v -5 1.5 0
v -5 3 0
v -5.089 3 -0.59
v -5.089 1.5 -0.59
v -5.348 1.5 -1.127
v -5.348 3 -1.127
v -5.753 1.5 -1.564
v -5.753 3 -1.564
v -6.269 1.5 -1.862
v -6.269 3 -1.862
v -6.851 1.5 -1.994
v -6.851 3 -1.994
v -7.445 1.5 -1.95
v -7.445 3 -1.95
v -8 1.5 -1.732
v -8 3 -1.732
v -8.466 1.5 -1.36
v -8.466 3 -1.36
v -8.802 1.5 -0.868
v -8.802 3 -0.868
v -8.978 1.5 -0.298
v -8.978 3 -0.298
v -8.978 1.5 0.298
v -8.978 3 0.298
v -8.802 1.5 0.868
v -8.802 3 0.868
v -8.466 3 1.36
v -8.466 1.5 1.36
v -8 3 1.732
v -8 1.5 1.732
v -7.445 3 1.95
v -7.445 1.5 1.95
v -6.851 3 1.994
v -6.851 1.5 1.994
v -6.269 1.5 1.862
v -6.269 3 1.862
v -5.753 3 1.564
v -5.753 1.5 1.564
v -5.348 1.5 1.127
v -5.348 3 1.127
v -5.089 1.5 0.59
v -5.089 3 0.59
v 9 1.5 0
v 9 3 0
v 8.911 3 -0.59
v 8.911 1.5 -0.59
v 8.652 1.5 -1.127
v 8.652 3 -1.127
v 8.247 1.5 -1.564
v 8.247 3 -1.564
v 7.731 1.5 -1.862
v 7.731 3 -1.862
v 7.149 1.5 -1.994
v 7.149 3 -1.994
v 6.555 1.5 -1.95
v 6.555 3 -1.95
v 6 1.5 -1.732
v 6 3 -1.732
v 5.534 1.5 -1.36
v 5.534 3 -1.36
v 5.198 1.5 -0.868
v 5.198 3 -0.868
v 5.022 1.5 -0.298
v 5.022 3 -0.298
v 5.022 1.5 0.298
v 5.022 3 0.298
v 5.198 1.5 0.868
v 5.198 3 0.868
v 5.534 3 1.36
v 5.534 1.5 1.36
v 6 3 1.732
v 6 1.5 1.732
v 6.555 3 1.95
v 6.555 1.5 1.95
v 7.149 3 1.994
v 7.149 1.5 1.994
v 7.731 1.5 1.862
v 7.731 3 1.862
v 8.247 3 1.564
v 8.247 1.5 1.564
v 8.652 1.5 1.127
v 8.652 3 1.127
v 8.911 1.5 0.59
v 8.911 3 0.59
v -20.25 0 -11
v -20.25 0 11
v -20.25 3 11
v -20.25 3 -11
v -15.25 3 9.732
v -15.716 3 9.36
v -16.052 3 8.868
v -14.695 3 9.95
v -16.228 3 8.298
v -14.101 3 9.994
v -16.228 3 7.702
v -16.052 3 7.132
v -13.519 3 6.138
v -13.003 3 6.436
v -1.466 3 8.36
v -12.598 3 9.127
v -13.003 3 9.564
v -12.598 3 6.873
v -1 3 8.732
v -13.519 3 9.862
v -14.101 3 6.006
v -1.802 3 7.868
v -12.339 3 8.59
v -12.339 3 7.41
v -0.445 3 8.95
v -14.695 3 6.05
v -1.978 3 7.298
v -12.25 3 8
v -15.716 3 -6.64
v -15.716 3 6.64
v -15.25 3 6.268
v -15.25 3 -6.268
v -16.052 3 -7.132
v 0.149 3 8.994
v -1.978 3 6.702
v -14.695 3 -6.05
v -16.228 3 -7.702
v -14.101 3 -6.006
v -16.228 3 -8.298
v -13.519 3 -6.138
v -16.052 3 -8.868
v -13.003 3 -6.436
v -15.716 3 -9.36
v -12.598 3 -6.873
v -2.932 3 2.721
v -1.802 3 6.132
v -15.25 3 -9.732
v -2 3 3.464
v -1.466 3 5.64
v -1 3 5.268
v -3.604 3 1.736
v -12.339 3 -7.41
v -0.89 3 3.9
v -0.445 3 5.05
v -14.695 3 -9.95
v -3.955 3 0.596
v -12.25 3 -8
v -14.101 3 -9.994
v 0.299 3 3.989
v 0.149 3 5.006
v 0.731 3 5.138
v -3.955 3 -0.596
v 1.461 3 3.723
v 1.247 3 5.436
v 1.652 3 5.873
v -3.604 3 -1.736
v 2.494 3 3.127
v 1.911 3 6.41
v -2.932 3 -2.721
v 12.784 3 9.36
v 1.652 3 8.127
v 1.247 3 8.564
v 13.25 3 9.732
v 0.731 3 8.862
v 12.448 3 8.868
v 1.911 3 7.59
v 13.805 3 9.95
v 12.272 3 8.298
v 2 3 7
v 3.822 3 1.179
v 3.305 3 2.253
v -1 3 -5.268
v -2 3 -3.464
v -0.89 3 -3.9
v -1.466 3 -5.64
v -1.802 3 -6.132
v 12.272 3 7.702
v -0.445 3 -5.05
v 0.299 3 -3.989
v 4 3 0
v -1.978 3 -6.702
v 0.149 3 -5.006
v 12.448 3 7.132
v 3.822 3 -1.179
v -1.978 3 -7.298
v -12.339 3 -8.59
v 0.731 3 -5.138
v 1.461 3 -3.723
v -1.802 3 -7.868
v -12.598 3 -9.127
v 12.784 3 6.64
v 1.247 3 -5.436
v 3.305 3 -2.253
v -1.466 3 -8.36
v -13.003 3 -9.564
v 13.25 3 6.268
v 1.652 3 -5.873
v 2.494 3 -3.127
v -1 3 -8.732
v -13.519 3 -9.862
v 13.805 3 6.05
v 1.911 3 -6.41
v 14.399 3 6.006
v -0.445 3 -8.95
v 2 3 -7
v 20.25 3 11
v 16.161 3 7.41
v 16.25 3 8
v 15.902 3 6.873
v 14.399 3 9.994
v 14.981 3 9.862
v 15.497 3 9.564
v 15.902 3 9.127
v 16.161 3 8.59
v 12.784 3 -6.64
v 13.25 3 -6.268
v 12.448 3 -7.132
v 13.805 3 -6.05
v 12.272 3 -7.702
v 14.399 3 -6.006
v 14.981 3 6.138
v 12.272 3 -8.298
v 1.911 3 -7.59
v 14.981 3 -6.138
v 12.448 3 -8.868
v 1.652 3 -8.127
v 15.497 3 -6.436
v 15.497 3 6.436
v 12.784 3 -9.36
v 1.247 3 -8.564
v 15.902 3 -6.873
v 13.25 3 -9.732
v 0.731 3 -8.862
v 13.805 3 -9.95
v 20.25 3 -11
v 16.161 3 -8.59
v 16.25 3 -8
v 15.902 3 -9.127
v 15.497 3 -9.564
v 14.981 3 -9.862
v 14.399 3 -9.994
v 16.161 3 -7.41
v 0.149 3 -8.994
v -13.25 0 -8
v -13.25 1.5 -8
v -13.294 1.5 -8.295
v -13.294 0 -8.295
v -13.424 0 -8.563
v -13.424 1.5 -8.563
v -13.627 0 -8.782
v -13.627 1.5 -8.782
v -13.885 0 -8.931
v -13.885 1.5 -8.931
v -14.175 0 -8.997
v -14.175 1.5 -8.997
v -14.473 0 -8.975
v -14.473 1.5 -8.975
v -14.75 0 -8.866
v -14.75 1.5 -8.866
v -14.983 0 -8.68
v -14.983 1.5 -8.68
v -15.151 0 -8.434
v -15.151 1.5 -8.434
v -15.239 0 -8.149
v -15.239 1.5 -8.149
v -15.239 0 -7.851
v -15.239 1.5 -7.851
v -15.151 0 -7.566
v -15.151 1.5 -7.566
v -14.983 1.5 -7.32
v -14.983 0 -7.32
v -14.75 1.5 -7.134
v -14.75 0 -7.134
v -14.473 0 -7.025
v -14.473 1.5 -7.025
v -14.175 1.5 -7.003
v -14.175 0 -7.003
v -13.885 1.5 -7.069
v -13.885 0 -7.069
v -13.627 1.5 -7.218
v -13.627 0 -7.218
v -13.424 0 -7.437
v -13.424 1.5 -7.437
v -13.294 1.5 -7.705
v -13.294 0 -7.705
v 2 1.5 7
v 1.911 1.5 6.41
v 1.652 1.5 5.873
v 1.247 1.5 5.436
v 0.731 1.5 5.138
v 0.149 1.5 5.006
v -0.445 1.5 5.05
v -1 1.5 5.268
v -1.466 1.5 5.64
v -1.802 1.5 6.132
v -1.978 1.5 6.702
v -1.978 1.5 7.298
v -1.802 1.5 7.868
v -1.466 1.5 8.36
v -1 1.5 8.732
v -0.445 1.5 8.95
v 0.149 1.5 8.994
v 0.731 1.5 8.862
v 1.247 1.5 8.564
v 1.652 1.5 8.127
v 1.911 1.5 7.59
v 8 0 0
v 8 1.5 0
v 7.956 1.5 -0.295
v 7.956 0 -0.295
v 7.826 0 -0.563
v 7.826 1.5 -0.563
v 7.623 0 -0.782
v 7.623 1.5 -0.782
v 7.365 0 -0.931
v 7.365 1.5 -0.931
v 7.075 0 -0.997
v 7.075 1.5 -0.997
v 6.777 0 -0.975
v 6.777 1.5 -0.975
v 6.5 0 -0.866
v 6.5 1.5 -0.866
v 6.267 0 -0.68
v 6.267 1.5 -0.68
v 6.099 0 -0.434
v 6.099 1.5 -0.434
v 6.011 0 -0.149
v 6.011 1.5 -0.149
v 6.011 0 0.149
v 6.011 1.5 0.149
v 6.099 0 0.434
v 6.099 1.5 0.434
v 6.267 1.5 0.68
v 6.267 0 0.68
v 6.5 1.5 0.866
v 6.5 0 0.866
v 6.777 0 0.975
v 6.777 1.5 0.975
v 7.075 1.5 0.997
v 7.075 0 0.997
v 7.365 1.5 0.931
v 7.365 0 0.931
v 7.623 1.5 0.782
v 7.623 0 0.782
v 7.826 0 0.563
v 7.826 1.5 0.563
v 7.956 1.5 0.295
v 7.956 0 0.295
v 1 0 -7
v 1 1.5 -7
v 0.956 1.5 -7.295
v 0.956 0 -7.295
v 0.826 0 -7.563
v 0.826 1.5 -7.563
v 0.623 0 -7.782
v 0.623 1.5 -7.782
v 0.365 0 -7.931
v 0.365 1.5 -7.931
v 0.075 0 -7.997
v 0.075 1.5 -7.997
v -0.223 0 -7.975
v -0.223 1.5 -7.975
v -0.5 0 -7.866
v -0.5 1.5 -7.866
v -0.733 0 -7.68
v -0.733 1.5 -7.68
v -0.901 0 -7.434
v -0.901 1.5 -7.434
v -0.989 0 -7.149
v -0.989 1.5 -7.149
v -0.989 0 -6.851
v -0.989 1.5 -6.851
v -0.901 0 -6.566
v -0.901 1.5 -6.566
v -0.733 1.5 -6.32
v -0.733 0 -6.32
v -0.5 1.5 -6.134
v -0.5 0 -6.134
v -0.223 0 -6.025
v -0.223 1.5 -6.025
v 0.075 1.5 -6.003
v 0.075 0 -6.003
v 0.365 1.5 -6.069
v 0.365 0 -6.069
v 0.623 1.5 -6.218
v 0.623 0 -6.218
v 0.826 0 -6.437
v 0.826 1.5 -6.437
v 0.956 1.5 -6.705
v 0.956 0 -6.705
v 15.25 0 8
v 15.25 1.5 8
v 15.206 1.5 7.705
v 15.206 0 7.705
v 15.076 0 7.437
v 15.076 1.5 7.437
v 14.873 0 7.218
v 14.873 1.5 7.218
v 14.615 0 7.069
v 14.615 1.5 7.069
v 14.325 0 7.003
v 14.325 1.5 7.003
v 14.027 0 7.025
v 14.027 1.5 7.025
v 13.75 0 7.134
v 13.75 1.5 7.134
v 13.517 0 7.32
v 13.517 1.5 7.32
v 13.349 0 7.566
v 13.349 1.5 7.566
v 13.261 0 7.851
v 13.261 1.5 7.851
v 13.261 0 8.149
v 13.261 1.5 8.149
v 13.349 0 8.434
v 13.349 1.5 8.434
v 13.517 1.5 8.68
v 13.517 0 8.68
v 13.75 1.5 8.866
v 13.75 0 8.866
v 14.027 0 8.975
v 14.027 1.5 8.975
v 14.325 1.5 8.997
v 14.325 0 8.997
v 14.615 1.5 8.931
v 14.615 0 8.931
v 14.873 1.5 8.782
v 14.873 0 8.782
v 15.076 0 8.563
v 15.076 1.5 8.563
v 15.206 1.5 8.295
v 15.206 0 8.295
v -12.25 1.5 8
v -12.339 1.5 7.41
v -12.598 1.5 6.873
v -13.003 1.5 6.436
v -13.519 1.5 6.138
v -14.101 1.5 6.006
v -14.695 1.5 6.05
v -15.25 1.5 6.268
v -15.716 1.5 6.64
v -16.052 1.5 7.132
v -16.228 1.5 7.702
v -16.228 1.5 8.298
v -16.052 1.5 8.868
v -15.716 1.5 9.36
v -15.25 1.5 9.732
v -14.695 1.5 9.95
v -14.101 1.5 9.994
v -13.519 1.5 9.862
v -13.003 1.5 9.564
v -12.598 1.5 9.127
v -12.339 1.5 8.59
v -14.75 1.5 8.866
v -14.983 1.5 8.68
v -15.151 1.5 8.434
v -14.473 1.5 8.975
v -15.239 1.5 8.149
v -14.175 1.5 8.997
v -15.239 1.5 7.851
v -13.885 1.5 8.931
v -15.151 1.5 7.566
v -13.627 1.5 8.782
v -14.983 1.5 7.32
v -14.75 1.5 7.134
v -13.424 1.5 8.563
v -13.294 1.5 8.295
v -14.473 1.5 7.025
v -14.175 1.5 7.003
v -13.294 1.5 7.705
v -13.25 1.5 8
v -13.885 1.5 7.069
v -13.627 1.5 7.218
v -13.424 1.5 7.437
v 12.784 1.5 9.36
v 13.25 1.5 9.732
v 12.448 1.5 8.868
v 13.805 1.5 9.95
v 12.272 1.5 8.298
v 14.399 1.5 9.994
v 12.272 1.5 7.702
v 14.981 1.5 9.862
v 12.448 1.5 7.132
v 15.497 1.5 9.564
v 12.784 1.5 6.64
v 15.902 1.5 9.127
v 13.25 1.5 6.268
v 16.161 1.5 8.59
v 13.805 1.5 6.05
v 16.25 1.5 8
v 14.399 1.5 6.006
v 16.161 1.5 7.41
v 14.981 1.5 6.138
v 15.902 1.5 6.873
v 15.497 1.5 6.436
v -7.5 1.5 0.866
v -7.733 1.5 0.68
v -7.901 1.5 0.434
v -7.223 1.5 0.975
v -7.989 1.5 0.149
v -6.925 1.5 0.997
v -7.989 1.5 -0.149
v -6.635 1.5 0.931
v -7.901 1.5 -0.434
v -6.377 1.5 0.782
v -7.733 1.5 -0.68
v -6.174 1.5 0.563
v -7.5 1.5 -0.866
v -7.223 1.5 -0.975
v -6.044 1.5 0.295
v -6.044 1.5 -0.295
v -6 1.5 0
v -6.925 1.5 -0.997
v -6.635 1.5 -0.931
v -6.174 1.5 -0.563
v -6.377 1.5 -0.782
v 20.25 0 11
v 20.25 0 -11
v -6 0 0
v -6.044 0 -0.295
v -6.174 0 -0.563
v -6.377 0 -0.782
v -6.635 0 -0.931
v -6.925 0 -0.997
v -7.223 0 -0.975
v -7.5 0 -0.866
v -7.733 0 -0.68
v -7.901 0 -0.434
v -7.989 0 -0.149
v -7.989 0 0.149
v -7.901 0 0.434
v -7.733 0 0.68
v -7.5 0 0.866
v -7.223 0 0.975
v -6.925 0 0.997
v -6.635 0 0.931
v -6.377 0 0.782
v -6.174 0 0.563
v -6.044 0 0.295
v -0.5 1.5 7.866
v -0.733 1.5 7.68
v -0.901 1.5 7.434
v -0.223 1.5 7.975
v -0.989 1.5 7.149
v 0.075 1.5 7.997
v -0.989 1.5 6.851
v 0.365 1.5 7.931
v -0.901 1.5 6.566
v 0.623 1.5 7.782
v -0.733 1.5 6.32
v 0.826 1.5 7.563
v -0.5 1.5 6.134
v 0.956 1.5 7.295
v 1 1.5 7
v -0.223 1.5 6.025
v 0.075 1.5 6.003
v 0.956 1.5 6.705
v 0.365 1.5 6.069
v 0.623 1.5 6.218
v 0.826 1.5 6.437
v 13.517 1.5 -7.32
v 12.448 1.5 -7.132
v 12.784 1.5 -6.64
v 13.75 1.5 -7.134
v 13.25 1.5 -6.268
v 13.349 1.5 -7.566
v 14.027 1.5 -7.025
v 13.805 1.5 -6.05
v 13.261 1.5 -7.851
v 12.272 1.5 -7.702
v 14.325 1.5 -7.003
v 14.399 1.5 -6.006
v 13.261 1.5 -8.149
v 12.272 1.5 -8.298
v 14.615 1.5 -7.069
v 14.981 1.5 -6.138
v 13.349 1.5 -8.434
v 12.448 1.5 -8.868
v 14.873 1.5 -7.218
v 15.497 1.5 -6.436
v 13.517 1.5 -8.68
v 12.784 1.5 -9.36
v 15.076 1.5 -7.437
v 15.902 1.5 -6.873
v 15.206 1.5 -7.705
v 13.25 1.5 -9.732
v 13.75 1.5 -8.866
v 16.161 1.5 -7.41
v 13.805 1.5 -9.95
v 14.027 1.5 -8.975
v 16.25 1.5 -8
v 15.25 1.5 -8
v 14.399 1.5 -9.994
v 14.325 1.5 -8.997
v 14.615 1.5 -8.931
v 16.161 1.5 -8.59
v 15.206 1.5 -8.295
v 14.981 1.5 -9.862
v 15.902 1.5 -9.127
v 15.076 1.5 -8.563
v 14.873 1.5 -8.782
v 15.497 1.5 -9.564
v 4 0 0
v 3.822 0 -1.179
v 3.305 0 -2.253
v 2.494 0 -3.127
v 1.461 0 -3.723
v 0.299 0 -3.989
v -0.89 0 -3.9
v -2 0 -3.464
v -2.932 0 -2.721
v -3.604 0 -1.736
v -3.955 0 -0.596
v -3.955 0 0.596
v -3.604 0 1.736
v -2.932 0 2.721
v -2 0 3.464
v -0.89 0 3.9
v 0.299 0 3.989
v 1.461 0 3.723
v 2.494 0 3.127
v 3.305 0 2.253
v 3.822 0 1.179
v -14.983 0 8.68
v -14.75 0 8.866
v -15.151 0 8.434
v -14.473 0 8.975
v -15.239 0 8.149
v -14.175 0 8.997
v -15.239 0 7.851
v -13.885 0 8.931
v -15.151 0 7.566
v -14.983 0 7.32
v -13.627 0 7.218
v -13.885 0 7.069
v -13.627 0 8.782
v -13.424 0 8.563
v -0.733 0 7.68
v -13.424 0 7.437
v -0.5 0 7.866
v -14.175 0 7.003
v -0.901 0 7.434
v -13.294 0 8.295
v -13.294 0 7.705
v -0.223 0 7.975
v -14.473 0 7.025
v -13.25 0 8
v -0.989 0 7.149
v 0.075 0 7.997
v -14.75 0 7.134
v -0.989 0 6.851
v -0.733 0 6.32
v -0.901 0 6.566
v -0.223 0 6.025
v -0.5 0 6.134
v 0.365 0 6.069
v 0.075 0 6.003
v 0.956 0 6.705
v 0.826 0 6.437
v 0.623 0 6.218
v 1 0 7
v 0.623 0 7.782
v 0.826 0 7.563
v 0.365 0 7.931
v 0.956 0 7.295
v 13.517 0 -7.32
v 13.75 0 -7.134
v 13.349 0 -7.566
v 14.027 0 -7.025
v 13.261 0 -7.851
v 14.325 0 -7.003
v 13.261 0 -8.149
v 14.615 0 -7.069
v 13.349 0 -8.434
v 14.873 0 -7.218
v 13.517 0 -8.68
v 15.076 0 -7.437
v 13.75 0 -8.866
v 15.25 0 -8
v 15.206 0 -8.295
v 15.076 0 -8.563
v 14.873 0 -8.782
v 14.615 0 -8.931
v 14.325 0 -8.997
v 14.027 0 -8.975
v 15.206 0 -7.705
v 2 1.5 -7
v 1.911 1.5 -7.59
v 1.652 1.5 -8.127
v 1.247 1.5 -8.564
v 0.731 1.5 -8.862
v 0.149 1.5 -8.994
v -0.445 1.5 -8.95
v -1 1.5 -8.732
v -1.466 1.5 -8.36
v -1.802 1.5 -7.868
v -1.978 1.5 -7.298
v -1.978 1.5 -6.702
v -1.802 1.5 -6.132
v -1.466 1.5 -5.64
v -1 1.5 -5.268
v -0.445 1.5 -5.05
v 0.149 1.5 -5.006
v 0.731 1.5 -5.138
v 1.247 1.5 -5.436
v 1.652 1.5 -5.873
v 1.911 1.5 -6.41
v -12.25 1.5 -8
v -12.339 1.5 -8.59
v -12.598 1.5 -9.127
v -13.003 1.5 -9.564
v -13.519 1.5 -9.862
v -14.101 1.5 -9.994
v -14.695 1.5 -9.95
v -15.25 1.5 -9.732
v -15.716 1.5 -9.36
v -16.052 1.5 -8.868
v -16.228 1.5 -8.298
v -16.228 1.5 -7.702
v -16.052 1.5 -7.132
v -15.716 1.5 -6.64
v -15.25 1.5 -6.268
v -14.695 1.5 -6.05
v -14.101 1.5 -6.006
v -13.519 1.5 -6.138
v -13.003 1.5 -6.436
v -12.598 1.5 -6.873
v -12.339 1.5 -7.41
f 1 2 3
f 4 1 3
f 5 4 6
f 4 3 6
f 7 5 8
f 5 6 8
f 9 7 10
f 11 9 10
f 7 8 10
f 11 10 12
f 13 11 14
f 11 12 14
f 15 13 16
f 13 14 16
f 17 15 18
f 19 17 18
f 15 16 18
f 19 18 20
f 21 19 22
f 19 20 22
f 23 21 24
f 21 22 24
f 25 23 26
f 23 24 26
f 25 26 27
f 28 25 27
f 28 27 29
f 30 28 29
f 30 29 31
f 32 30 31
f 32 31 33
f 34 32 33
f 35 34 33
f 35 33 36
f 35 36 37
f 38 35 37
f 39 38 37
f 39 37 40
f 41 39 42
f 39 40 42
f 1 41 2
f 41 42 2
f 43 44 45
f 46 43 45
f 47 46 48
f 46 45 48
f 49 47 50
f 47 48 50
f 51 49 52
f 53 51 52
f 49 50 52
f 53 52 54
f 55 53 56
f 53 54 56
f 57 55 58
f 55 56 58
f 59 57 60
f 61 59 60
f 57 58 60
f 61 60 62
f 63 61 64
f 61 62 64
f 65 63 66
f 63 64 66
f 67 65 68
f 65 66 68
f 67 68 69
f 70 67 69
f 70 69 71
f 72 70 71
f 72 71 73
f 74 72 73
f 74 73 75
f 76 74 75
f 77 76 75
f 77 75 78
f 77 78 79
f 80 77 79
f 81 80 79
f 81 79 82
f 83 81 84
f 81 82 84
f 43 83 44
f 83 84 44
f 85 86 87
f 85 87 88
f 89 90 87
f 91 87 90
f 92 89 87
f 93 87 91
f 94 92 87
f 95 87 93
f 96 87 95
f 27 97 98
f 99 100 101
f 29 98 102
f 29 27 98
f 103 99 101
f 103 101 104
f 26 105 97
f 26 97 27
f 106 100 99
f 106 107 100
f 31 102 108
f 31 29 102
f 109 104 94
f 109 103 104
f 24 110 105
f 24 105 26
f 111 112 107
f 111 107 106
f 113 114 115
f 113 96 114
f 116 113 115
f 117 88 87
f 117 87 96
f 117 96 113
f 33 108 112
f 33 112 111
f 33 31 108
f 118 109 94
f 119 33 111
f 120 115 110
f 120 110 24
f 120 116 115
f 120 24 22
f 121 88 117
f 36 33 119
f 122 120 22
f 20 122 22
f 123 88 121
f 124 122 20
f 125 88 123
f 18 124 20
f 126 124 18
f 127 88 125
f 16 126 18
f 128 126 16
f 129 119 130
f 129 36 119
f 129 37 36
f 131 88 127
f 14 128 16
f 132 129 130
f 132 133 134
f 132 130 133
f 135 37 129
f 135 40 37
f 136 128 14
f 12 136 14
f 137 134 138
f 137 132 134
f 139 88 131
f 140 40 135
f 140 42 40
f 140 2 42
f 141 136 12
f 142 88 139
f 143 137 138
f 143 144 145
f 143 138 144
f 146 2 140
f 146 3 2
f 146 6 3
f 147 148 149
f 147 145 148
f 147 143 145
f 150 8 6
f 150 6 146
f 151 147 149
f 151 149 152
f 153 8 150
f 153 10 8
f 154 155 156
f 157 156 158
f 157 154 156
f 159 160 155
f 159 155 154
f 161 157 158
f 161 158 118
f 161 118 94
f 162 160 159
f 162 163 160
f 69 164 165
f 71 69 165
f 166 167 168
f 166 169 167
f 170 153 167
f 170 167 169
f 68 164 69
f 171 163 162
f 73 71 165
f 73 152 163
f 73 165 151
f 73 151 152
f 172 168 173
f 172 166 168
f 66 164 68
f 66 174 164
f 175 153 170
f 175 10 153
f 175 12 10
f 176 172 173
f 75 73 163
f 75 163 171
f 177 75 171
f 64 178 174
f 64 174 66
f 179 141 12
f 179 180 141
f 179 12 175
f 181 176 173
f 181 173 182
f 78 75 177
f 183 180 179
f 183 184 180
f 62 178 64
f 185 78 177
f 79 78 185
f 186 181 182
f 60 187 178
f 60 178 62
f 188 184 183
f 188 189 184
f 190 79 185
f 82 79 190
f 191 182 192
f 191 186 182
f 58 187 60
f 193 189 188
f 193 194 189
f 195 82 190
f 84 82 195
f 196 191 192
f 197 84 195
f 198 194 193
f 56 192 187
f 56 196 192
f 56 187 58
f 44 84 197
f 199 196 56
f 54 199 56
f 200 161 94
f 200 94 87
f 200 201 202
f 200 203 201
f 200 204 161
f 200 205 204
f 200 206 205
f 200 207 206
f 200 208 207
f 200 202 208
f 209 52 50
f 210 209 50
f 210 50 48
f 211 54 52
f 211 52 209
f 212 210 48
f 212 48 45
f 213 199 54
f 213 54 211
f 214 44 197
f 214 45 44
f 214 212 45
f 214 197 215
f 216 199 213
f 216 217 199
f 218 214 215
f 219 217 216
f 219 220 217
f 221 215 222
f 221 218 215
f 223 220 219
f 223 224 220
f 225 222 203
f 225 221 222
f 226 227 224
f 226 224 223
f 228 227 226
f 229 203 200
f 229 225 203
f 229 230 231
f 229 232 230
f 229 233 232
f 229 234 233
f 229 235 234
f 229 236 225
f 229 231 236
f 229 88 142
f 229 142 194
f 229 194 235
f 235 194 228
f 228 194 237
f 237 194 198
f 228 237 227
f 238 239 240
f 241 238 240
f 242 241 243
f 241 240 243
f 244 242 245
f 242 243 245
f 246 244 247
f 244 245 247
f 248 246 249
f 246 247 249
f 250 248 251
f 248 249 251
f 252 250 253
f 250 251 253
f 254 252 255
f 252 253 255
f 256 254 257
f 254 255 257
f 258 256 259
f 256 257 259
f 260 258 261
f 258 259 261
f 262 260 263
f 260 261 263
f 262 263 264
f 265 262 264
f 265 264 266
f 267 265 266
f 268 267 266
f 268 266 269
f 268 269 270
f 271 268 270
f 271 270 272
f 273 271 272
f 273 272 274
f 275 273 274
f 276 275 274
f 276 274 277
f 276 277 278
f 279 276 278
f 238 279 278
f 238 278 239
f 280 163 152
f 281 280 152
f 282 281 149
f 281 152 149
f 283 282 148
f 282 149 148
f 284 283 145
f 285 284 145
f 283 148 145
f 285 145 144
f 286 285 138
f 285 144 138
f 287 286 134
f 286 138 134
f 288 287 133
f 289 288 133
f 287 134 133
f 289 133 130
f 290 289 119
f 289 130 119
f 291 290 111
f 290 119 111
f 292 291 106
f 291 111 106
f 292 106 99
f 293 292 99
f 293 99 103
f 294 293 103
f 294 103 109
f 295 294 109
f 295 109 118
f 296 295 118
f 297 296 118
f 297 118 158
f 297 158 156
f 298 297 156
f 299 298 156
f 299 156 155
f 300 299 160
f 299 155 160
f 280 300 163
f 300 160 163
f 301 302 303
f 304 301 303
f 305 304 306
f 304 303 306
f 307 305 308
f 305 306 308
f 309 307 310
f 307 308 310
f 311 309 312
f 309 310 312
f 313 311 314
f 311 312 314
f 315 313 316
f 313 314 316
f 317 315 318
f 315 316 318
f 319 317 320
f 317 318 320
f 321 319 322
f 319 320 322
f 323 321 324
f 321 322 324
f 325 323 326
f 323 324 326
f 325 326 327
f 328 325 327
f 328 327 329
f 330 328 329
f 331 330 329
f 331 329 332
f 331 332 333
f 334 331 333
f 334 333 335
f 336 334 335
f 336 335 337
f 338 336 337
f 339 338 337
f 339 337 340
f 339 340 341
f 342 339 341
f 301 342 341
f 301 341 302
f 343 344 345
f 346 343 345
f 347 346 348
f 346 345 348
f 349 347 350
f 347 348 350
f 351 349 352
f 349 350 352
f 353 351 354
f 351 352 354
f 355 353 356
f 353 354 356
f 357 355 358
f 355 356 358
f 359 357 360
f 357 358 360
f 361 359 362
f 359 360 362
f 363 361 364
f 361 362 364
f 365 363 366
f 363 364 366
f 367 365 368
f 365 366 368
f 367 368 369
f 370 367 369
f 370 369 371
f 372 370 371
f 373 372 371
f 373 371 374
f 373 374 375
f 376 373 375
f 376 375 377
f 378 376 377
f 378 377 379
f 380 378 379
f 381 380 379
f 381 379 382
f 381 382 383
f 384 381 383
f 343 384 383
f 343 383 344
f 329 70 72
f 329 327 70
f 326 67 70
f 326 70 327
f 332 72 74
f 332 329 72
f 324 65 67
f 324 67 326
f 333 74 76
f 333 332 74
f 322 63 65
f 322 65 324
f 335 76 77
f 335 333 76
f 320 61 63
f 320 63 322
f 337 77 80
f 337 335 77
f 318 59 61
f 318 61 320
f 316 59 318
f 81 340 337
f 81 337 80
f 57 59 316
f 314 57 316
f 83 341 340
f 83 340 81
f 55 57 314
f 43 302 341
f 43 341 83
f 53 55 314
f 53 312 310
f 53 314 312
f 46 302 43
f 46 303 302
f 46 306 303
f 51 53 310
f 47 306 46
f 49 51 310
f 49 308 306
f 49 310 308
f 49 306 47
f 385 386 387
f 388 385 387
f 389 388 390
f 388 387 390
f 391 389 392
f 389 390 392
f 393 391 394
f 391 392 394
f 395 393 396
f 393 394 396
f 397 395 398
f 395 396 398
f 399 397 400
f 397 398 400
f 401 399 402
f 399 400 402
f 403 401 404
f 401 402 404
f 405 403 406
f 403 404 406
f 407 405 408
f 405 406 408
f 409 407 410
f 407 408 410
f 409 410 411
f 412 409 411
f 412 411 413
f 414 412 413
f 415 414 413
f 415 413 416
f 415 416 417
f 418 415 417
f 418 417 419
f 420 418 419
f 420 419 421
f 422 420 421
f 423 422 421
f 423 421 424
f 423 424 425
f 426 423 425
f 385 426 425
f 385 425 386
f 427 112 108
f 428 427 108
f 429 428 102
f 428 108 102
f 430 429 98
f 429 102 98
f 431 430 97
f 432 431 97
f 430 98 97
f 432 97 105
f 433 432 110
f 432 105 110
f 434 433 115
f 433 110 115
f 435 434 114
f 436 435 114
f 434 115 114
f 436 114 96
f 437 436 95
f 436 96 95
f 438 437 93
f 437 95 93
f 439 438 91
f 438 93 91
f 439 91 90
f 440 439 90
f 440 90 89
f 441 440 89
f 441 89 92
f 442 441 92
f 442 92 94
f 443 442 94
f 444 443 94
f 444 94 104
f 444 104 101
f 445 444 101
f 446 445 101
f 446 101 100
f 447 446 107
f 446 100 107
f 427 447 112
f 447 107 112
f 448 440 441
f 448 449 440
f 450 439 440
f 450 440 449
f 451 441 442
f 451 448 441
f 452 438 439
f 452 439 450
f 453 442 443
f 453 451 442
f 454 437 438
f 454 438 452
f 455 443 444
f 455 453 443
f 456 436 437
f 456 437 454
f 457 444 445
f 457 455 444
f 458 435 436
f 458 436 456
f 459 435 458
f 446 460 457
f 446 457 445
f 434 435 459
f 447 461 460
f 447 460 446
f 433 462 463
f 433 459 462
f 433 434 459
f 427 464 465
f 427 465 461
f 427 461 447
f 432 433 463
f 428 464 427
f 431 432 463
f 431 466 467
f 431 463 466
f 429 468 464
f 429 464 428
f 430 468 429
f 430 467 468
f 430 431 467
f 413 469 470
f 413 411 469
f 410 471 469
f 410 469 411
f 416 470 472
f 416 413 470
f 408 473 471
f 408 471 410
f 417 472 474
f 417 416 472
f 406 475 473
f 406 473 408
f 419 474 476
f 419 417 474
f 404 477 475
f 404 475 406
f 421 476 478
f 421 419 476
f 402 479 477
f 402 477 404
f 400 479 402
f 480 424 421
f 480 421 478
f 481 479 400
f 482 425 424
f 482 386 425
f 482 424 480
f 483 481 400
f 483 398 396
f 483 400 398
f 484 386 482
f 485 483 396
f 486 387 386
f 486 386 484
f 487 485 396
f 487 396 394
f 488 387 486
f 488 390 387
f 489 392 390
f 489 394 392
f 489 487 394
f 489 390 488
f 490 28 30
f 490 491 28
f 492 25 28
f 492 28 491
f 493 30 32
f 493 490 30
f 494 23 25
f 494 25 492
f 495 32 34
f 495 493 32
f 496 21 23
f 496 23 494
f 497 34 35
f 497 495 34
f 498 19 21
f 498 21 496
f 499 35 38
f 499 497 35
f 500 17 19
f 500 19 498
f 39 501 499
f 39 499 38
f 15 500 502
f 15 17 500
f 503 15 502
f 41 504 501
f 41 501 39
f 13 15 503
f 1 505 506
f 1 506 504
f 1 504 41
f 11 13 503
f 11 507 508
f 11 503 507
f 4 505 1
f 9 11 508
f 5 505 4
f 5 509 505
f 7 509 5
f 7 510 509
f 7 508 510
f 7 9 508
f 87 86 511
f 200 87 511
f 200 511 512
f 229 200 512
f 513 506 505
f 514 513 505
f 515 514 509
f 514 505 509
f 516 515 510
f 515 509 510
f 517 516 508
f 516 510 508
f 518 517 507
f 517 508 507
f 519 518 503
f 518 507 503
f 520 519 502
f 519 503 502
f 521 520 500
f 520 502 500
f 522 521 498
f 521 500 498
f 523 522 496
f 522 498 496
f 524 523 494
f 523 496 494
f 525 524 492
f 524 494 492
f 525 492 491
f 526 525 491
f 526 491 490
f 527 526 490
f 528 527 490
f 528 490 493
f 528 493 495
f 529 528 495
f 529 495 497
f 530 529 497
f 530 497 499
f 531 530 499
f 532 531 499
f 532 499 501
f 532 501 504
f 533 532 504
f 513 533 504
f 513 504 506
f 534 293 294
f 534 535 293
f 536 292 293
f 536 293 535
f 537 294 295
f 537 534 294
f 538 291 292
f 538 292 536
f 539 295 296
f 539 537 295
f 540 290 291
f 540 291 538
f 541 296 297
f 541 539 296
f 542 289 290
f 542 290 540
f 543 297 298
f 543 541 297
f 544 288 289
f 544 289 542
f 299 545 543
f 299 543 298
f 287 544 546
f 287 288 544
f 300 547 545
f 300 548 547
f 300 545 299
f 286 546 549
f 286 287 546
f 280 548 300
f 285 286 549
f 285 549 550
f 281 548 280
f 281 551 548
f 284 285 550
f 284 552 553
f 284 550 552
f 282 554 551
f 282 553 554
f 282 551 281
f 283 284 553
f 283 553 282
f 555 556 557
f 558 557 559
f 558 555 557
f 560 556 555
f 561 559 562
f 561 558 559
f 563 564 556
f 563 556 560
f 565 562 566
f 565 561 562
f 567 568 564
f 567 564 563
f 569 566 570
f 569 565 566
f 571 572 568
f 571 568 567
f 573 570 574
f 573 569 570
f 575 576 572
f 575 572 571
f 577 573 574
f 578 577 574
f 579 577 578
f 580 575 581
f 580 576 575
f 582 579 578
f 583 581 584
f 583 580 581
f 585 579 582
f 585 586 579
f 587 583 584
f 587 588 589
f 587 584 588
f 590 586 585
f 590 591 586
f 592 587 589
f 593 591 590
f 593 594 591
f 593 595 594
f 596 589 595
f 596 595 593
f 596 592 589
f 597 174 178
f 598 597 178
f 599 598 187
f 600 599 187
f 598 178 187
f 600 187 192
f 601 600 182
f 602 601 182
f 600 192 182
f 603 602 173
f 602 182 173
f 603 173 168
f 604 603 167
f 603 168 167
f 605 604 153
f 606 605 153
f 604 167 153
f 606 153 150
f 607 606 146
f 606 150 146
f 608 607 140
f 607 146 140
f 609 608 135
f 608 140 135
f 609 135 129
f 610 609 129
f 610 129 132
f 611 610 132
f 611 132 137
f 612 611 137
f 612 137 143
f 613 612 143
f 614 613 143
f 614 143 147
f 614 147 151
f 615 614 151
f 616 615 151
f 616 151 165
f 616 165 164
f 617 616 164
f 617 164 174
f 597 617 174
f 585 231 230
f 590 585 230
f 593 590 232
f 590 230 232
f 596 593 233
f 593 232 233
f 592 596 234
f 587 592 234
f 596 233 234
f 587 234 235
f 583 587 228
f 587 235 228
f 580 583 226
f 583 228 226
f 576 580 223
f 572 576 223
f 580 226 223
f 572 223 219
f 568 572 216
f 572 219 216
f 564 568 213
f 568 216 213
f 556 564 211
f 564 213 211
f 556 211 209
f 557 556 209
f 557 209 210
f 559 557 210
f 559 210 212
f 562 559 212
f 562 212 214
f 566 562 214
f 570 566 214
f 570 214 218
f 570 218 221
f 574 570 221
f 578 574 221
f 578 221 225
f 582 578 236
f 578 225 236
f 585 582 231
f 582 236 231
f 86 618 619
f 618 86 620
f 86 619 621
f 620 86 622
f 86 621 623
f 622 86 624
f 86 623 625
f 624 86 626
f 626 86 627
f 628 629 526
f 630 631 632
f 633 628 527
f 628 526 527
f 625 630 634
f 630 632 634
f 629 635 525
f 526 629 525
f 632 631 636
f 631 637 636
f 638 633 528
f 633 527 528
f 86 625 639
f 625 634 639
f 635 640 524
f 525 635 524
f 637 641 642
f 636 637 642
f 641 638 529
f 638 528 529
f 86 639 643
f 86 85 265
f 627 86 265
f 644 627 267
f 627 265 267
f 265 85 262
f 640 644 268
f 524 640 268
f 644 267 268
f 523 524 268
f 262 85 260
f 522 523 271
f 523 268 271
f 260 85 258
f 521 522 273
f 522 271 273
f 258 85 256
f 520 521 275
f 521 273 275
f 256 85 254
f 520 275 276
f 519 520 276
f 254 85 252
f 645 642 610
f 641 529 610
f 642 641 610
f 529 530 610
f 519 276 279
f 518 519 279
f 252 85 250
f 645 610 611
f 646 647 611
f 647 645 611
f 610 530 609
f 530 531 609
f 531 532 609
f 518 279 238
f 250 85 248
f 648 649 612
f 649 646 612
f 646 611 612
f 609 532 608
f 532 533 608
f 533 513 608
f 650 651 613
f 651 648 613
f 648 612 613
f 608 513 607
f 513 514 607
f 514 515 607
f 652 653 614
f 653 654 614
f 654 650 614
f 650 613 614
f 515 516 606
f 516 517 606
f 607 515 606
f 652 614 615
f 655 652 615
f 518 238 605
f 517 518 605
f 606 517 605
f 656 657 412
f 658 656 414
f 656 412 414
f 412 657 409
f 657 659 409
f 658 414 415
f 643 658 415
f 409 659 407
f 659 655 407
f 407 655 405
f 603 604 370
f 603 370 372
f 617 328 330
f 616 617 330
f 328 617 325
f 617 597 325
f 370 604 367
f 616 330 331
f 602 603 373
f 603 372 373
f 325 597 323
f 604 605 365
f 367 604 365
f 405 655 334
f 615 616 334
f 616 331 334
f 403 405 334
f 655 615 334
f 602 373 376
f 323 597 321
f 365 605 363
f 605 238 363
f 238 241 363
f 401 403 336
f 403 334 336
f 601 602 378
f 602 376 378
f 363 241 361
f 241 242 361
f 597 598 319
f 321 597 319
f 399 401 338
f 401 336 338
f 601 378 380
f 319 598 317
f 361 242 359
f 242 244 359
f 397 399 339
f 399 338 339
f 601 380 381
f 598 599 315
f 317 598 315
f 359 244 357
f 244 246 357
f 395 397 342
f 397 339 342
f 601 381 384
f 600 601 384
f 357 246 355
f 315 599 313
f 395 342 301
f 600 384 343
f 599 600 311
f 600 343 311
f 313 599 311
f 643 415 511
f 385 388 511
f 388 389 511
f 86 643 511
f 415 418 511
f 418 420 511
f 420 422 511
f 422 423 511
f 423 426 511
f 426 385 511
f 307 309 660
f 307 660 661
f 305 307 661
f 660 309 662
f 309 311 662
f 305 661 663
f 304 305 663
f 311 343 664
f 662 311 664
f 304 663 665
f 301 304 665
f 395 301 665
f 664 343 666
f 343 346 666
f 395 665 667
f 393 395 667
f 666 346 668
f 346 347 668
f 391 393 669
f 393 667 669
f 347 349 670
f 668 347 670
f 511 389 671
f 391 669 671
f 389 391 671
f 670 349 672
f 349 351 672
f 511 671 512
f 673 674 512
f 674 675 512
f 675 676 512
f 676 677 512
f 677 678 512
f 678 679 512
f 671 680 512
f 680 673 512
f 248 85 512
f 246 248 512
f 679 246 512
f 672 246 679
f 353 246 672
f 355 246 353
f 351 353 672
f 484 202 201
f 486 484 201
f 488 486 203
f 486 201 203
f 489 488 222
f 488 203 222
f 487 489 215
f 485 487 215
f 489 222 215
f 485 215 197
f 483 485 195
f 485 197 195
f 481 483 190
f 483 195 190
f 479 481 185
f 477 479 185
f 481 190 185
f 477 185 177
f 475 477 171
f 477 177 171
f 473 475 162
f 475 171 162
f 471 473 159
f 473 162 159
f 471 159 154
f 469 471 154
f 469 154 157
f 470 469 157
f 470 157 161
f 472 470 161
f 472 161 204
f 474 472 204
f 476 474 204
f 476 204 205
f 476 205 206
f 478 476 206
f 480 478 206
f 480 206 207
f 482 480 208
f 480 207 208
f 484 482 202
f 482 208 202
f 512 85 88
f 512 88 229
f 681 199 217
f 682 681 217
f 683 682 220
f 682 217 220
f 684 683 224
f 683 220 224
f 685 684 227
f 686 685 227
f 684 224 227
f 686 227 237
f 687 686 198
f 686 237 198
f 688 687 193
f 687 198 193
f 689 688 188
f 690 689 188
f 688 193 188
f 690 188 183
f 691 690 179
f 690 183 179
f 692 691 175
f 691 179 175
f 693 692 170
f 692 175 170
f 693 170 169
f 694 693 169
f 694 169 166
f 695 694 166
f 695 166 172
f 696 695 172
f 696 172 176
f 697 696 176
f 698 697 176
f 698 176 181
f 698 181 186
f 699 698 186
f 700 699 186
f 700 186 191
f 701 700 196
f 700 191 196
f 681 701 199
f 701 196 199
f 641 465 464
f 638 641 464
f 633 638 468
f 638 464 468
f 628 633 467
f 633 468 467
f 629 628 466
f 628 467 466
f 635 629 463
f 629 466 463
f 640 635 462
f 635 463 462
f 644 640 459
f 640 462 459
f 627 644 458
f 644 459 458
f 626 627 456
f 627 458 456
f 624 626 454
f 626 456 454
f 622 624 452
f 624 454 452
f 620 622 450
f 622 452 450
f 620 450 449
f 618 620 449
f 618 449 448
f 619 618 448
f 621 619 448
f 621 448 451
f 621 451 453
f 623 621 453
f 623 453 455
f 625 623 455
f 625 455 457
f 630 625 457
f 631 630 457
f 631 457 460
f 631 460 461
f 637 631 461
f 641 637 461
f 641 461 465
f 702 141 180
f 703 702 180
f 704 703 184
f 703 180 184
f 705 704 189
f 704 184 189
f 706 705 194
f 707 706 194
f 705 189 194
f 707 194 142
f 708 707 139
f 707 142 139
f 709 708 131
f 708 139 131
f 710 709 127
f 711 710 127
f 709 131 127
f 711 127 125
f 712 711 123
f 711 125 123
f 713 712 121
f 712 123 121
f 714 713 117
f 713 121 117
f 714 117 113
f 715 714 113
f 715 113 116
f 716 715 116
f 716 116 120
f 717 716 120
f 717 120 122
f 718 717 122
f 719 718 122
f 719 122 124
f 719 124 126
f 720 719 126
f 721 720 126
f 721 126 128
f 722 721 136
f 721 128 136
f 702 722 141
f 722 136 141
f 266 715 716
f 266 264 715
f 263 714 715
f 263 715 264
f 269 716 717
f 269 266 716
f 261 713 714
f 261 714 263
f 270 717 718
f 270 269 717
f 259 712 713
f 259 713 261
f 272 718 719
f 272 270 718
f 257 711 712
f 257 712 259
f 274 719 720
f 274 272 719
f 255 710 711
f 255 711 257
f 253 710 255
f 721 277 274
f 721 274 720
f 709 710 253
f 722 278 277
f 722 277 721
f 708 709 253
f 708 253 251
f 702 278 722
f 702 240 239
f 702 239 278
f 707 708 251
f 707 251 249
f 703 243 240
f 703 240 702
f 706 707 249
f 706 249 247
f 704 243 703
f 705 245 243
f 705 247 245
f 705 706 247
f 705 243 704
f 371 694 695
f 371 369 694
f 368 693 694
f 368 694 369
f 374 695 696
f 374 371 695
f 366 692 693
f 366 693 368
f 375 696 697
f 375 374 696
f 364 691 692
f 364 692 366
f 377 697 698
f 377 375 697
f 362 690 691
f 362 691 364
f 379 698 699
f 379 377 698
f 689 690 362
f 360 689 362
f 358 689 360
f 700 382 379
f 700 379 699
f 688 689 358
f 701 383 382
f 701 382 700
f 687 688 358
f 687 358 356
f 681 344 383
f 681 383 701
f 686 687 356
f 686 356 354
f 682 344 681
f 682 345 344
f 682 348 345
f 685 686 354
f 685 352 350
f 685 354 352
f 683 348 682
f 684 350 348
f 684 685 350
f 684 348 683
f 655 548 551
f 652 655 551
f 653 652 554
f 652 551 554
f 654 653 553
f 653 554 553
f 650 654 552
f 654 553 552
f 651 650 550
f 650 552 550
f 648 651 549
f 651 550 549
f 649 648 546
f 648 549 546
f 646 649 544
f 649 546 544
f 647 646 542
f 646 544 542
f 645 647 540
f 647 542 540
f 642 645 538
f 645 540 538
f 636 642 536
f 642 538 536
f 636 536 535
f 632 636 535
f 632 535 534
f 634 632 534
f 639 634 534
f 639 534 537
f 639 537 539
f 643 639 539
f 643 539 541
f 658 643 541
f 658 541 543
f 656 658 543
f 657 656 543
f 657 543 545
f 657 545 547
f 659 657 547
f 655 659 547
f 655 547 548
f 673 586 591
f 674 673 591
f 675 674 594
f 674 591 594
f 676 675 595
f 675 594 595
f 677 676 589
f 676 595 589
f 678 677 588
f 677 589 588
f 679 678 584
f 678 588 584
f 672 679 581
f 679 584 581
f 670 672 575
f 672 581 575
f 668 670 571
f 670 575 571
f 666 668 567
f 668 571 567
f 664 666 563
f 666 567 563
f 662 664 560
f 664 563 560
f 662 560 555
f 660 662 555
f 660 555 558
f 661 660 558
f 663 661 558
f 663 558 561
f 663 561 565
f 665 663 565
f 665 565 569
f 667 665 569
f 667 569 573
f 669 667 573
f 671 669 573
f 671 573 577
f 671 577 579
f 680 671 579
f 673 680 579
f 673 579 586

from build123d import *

# Parameters (mm, degrees)
SKETCH1_W           = 40.5
SKETCH1_H           = 22
BOSS_EXTRUDE1_DEPTH = 3
SKETCH2_R           = 1
CUT_EXTRUDE1_DEPTH  = 10
SKETCH3_R           = 4
CUT_EXTRUDE2_DEPTH  = 10
SKETCH4_R           = 1
CUT_EXTRUDE3_DEPTH  = 10
SKETCH5_R           = 2
CUT_EXTRUDE4_DEPTH  = 1.5


with BuildPart() as part:
    # Sketch1 → Boss-Extrude1 (new body)
    with BuildSketch(Plane(origin=(0, 0, 0), x_dir=(1, 0, 0), z_dir=(0, 1, 0))):
        Rectangle(SKETCH1_W, SKETCH1_H)
    extrude(amount=BOSS_EXTRUDE1_DEPTH)

    # Sketch2 → Cut-Extrude1 (cut)
    with BuildSketch(Plane(origin=(0, 3, 0), x_dir=(1, 0, 0), z_dir=(0, 1, 0))):
        with Locations((-14.25, 8)):
            Circle(SKETCH2_R)
        with Locations((-14.25, -8)):
            Circle(SKETCH2_R)
        with Locations((14.25, -8)):
            Circle(SKETCH2_R)
        with Locations((14.25, 8)):
            Circle(SKETCH2_R)
    extrude(amount=-CUT_EXTRUDE1_DEPTH, mode=Mode.SUBTRACT)

    # Sketch3 → Cut-Extrude2 (cut)
    with BuildSketch(Plane(origin=(0, 3, 0), x_dir=(1, 0, 0), z_dir=(0, 1, 0))):
        Circle(SKETCH3_R)
    extrude(amount=-CUT_EXTRUDE2_DEPTH, mode=Mode.SUBTRACT)

    # Sketch4 → Cut-Extrude3 (cut)
    with BuildSketch(Plane(origin=(0, 3, 0), x_dir=(1, 0, 0), z_dir=(0, 1, 0))):
        with Locations((0, 7)):
            Circle(SKETCH4_R)
        with Locations((7, 0)):
            Circle(SKETCH4_R)
        with Locations((0, -7)):
            Circle(SKETCH4_R)
        with Locations((-7, 0)):
            Circle(SKETCH4_R)
    extrude(amount=-CUT_EXTRUDE3_DEPTH, mode=Mode.SUBTRACT)

    # Sketch5 → Cut-Extrude4 (cut)
    with BuildSketch(Plane(origin=(0, 3, 0), x_dir=(1, 0, 0), z_dir=(0, 1, 0))):
        with Locations((14.25, 8)):
            Circle(SKETCH5_R)
        with Locations((0, 7)):
            Circle(SKETCH5_R)
        with Locations((-14.25, 8)):
            Circle(SKETCH5_R)
        with Locations((7, 0)):
            Circle(SKETCH5_R)
        with Locations((-7, 0)):
            Circle(SKETCH5_R)
        with Locations((-14.25, -8)):
            Circle(SKETCH5_R)
        with Locations((0, -7)):
            Circle(SKETCH5_R)
        with Locations((14.25, -8)):
            Circle(SKETCH5_R)
    extrude(amount=-CUT_EXTRUDE4_DEPTH, mode=Mode.SUBTRACT)


solid = part.part
